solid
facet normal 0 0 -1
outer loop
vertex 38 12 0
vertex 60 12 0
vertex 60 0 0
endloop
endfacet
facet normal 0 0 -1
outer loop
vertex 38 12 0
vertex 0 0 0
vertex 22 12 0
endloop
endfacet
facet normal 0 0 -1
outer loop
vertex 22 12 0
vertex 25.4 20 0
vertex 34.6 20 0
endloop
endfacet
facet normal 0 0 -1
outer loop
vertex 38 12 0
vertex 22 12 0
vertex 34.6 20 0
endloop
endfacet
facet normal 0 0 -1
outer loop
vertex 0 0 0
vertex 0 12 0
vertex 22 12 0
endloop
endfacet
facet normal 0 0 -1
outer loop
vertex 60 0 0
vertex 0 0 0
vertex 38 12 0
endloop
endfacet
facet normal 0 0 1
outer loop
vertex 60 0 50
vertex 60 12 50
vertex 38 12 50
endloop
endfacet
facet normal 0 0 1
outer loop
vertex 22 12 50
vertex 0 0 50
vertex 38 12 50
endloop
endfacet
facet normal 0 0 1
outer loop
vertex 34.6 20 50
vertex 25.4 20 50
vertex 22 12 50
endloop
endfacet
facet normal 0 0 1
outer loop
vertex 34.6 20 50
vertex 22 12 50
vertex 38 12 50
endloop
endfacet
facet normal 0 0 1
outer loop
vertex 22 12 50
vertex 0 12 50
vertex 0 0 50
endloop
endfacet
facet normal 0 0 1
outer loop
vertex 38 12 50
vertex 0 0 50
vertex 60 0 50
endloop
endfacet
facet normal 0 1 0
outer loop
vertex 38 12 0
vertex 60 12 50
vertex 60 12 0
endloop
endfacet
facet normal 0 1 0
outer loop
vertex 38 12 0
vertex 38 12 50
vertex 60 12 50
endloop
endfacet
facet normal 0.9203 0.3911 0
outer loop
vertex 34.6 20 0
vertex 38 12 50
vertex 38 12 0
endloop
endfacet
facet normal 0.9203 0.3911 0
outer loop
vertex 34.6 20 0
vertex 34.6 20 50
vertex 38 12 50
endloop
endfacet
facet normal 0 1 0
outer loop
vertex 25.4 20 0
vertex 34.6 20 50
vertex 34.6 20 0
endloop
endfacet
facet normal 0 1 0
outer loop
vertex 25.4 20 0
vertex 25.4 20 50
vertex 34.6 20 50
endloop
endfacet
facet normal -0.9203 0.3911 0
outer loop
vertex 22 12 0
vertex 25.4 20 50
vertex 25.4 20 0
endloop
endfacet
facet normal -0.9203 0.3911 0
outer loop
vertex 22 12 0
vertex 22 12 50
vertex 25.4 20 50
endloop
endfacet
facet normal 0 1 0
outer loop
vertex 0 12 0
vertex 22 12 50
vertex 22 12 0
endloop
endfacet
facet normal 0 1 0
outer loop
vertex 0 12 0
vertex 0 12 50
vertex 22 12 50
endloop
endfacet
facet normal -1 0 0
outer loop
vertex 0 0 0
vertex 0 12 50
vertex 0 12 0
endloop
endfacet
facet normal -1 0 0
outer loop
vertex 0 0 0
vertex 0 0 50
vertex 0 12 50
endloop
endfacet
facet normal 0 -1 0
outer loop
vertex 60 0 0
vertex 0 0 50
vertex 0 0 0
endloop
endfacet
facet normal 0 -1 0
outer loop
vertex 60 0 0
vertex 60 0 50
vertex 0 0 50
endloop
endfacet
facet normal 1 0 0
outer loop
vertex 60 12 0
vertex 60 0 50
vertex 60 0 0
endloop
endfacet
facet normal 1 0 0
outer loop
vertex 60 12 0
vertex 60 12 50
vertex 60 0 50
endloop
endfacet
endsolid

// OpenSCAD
$fn = 32;

// ----------------------------------------------------------------------
// V guide rail: dovetail, 60 mm wide
// ----------------------------------------------------------------------

// --- parameters (mm) ---
rail_w = 60;              // rail width, X
base_t = 12;              // base plate thickness
v_depth = 8;              // V feature depth / height
v_half_w = 8;             // half width of the V at the base face
plate_t = 50;             // rail length, Z (the extrusion height)
top_half_w = 4.6;         // half width at the dovetail top

dovetail_base = 2 * v_half_w;  // dovetail width at the base
dovetail_top = 2 * top_half_w;  // dovetail width at the top

profile = [[0, 0], [60, 0], [60, 12], [38, 12], [34.6, 20], [25.4, 20], [22, 12], [0, 12]];  // primary outline, 8 points, counter clockwise

// --- the one profile operation ---
linear_extrude(height = plate_t) polygon(points = profile);
